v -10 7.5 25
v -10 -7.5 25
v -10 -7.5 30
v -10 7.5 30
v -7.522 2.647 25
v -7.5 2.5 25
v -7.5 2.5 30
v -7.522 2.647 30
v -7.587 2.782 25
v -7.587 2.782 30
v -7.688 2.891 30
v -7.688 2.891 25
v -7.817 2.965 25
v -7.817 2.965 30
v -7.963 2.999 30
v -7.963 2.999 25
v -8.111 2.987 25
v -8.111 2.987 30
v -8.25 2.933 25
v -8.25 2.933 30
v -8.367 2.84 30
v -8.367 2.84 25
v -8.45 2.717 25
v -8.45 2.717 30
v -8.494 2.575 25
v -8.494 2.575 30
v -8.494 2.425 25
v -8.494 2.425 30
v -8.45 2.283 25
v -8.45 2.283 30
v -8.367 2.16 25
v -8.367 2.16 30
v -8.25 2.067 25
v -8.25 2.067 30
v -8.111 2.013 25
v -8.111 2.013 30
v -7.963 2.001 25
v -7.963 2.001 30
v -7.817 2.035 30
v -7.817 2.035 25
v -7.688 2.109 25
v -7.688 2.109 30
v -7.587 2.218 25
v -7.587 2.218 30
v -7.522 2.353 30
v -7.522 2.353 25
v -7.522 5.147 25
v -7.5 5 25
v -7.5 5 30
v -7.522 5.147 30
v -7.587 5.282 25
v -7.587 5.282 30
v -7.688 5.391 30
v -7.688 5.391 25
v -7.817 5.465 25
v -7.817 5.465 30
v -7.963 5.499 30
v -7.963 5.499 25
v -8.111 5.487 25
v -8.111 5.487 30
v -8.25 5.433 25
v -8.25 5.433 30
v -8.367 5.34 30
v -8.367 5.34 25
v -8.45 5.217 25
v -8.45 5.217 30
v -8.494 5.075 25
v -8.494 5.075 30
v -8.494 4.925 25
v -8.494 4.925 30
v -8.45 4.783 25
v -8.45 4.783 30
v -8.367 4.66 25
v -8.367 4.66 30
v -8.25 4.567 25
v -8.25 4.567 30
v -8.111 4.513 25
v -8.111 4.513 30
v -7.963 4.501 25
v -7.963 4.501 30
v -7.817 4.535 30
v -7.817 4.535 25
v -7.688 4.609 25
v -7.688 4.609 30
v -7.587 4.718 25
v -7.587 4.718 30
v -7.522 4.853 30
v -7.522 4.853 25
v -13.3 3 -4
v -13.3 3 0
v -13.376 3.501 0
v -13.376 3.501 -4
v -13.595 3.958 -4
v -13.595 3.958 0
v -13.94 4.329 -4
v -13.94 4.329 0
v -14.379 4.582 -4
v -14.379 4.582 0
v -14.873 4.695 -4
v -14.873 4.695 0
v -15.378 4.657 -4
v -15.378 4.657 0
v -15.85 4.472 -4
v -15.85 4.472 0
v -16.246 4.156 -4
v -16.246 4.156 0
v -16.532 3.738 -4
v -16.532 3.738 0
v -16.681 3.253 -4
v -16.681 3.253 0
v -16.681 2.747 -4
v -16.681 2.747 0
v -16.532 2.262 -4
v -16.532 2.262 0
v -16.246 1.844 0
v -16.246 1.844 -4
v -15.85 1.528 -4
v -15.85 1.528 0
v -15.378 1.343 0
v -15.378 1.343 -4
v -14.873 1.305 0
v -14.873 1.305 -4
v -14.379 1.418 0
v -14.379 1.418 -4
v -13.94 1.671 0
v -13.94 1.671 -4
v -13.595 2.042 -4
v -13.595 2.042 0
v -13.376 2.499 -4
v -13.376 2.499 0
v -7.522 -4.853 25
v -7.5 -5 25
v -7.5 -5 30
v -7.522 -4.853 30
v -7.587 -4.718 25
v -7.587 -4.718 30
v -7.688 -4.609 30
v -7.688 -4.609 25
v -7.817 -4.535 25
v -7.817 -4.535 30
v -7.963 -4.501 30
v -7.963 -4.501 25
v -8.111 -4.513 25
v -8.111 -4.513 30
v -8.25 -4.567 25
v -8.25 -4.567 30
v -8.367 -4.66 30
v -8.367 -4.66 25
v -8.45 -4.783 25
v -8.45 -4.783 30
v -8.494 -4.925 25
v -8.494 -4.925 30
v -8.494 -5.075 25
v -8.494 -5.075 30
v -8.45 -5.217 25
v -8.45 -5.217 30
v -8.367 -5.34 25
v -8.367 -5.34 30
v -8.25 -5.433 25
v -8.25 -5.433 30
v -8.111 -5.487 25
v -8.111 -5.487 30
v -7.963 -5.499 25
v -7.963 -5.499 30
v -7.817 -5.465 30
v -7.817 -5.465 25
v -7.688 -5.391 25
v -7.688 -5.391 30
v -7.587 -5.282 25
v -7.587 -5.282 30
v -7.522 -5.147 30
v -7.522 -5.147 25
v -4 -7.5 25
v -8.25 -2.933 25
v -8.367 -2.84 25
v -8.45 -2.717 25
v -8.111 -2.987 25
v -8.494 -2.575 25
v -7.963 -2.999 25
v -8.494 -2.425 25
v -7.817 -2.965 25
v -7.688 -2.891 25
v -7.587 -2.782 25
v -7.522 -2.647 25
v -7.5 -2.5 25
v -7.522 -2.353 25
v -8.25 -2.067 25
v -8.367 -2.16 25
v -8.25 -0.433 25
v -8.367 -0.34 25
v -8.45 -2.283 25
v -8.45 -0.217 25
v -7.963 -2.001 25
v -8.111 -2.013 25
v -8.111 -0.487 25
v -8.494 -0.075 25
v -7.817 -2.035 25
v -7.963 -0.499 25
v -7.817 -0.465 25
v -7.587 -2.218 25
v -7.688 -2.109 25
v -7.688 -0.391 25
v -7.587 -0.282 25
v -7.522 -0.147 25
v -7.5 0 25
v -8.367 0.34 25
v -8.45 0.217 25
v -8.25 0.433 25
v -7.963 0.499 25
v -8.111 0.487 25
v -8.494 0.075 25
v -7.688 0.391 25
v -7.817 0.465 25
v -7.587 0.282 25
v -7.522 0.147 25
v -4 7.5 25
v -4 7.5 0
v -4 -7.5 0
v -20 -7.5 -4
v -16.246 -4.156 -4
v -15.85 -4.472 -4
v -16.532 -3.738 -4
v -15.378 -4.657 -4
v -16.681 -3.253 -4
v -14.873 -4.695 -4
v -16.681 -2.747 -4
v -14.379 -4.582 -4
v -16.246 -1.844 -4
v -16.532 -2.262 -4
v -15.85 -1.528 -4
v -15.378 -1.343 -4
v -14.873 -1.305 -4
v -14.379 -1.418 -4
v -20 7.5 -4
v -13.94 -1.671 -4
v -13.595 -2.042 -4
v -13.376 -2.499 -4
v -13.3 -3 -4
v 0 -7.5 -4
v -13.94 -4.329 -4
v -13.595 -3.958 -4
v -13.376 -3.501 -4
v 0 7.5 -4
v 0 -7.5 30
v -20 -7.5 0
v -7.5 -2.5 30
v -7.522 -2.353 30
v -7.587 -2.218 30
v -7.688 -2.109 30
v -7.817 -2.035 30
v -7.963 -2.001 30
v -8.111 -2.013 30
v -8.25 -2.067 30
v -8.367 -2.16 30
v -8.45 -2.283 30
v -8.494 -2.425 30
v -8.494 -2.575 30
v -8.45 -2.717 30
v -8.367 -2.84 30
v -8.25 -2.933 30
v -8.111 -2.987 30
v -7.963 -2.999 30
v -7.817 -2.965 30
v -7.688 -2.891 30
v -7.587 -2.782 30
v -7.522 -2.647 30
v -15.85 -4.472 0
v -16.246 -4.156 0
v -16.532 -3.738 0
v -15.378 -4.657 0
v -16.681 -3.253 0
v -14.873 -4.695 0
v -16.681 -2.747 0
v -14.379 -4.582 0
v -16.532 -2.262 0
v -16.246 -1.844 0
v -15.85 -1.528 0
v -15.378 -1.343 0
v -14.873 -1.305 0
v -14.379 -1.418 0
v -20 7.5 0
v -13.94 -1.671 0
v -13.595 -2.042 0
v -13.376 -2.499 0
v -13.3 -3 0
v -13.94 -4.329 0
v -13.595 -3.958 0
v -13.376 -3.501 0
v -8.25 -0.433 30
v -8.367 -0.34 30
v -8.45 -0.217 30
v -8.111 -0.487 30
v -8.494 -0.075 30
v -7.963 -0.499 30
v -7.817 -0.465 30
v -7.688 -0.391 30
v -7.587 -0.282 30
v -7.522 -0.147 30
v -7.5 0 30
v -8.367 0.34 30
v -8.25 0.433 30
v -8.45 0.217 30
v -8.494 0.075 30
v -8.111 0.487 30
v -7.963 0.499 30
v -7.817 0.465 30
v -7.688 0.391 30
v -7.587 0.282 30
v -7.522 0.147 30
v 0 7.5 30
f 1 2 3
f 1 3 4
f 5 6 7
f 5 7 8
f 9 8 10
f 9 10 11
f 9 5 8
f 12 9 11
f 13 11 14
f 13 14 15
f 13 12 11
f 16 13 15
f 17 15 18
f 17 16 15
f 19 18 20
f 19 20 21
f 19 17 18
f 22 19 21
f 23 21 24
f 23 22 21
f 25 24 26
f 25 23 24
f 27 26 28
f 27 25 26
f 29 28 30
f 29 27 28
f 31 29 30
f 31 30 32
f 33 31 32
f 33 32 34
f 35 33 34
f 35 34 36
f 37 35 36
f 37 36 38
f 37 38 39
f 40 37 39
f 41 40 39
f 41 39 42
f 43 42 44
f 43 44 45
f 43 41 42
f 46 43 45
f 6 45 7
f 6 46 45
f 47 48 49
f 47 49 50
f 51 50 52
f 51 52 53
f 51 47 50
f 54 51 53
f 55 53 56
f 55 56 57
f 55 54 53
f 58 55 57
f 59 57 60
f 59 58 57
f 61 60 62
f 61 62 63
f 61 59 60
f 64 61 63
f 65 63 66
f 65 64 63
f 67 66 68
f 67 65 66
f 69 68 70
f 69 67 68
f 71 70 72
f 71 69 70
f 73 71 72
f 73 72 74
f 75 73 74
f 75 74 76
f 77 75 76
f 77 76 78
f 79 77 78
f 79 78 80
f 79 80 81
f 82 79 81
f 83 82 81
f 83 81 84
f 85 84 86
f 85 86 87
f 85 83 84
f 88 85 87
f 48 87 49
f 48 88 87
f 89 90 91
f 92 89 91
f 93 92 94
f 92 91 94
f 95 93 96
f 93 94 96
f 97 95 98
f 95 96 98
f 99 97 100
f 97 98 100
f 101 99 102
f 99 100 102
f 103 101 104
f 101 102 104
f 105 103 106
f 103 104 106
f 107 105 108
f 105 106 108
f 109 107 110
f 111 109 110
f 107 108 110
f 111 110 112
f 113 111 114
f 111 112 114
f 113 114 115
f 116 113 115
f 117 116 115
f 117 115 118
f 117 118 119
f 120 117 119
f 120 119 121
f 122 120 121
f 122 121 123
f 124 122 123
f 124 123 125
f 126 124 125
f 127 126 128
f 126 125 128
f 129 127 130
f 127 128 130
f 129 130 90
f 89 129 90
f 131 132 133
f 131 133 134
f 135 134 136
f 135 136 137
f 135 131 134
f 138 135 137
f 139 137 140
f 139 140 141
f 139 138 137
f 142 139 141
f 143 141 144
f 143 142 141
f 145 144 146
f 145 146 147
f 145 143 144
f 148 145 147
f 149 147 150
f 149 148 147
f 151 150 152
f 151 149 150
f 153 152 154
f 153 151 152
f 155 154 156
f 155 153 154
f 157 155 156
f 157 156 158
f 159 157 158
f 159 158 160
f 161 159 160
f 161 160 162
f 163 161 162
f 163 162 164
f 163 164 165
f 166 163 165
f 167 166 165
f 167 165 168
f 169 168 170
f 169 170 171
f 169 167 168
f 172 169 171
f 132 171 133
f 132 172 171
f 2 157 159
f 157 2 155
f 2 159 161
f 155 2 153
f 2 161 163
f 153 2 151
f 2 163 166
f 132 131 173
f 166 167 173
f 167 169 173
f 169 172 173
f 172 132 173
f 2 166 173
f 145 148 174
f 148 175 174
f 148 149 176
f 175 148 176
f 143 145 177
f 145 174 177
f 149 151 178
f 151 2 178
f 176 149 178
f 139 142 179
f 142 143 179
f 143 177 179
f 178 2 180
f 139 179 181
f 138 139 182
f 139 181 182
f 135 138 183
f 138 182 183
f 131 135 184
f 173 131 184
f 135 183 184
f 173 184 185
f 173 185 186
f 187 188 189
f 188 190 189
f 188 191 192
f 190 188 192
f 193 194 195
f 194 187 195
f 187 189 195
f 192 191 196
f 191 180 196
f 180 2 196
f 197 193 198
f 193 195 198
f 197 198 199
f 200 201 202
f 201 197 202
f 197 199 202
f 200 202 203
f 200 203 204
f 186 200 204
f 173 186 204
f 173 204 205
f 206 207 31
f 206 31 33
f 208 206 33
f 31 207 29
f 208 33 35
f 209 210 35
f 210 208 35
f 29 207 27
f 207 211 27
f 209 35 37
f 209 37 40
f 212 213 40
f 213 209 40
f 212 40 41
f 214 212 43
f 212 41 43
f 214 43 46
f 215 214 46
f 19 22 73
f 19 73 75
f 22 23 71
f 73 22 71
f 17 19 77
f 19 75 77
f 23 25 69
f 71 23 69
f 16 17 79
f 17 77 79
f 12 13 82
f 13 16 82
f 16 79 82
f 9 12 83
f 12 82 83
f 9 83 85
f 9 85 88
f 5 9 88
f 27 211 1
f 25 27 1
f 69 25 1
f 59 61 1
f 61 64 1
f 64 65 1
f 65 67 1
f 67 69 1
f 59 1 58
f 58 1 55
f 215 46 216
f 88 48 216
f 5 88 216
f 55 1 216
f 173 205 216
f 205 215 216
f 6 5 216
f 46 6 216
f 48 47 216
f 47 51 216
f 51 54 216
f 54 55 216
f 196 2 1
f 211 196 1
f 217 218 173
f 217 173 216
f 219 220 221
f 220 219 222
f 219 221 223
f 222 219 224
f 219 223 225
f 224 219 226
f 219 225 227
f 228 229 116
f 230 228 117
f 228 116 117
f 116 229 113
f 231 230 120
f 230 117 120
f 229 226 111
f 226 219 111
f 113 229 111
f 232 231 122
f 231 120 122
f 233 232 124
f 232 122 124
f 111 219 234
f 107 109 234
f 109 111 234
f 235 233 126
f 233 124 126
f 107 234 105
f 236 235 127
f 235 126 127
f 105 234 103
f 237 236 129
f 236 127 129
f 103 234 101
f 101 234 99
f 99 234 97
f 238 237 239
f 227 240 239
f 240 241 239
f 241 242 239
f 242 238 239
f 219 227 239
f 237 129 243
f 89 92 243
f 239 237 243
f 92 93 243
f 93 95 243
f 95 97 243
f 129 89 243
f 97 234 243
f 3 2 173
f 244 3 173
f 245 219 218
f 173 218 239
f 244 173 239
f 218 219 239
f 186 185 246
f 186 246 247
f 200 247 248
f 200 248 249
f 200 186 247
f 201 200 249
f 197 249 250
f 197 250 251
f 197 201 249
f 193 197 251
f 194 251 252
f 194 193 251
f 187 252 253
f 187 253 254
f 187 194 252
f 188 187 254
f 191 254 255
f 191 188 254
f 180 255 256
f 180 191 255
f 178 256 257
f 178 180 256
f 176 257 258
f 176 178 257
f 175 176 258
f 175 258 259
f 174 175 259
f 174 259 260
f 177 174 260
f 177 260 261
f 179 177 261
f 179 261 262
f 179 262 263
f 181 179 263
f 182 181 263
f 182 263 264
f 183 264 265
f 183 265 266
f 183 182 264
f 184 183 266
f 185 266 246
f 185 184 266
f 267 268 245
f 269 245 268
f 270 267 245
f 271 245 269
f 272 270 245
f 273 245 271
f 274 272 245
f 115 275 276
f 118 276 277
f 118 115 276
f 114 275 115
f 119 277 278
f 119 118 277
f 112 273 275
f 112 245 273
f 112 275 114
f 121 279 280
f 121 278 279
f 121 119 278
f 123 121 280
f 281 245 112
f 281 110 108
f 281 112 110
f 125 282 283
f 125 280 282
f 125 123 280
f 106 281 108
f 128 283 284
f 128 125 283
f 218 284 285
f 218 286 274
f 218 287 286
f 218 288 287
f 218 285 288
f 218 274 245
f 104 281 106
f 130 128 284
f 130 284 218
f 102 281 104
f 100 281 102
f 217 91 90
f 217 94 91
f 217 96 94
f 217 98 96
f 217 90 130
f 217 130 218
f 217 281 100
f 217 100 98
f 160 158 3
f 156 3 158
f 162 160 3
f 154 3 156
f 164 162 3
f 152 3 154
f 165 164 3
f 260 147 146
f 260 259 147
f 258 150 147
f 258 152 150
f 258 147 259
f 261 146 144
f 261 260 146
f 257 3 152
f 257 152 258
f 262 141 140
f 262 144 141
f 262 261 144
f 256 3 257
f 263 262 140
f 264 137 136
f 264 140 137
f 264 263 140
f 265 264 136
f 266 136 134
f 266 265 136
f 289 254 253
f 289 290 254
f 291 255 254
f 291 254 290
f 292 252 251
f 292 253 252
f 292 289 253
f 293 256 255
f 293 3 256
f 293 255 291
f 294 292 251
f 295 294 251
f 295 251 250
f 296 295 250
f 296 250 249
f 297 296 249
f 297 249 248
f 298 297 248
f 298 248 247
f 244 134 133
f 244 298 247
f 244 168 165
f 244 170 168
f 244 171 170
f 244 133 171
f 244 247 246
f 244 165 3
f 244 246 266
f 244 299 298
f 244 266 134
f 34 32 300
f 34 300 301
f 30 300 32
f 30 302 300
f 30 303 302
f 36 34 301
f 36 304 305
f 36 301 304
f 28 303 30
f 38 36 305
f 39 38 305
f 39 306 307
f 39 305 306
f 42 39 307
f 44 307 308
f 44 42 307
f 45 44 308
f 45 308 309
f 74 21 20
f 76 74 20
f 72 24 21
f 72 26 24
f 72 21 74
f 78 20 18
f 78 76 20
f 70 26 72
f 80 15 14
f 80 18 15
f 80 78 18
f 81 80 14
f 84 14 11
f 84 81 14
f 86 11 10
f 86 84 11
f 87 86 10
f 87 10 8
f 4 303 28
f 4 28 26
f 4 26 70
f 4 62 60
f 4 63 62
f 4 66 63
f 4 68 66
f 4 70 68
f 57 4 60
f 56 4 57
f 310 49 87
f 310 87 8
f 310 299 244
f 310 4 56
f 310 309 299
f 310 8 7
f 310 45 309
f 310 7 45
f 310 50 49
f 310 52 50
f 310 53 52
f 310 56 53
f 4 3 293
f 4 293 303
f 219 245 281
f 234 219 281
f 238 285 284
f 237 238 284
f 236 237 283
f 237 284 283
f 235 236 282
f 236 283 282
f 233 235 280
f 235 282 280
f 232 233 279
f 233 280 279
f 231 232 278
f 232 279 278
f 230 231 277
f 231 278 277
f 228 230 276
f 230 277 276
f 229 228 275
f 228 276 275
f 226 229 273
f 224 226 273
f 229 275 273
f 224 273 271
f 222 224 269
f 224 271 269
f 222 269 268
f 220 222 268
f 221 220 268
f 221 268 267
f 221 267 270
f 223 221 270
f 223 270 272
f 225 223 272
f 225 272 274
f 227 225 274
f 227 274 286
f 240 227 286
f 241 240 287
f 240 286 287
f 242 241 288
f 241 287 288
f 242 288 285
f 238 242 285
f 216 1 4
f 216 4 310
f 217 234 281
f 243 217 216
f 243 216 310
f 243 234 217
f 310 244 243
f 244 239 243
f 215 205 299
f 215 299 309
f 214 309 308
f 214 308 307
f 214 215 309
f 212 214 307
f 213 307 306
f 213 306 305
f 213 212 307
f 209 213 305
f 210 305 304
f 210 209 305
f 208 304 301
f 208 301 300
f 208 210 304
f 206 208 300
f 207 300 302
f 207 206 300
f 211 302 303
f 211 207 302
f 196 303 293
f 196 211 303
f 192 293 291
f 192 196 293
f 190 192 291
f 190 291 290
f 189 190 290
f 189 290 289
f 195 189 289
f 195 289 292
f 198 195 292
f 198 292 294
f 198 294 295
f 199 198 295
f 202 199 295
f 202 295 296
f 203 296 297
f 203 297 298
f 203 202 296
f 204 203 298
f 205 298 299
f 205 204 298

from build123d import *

# Parameters (mm, degrees)
F0_W     = 16
F0_H     = 15
F0_R     = 1.7
F0_W_2   = 4
F1_DEPTH = 4
F2_DEPTH = 25
F3_W     = 10
F3_H     = 15
F3_R     = 0.5
F4_DEPTH = 5


with BuildPart() as f1:
    # F0 (on Top) → F1 (new body)
    with BuildSketch(Plane.XY):
        with Locations((-12, 0)):
            Rectangle(F0_W, F0_H)
        with Locations((-15, -3)):
            Circle(F0_R, mode=Mode.SUBTRACT)
        with Locations((-15, 3)):
            Circle(F0_R, mode=Mode.SUBTRACT)
        with Locations((-2, 0)):
            Rectangle(F0_W_2, F0_H)
    extrude(amount=-F1_DEPTH)

    # F0 (on Top) → F2 (join)
    with BuildSketch(Plane.XY):
        with Locations((-2, 0)):
            Rectangle(F0_W_2, F0_H)
    extrude(amount=F2_DEPTH)

    # F3 (on face) → F4 (join)
    with BuildSketch(Plane.XY.offset(25)):
        with Locations((-5, 0)):
            Rectangle(F3_W, F3_H)
        with Locations((-8, -5)):
            Circle(F3_R, mode=Mode.SUBTRACT)
        with Locations((-8, -2.5)):
            Circle(F3_R, mode=Mode.SUBTRACT)
        with Locations((-8, 0)):
            Circle(F3_R, mode=Mode.SUBTRACT)
        with Locations((-8, 2.5)):
            Circle(F3_R, mode=Mode.SUBTRACT)
        with Locations((-8, 5)):
            Circle(F3_R, mode=Mode.SUBTRACT)
    extrude(amount=F4_DEPTH)


solid = f1.part
